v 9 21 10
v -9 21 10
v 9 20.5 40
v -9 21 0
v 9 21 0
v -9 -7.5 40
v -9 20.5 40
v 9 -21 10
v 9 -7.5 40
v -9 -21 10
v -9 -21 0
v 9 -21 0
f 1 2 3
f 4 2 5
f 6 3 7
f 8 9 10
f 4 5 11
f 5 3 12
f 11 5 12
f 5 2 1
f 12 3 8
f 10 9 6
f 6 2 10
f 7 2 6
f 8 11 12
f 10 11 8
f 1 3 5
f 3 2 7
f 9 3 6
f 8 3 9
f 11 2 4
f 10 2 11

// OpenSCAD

l = 40;
b = 16;
w = 40;
t = 1.0;
o = 0.65;

	hull()
	{
		translate( [ 0, 0, 5 ] )
		cube( [ b+t*2, w+t*2, 10 ], center = true );
		translate( [ 0, w*o/4, l-5 ] )
		cube( [ b+t*2, w*o+t*2, 10 ], center = true );
	}
 
